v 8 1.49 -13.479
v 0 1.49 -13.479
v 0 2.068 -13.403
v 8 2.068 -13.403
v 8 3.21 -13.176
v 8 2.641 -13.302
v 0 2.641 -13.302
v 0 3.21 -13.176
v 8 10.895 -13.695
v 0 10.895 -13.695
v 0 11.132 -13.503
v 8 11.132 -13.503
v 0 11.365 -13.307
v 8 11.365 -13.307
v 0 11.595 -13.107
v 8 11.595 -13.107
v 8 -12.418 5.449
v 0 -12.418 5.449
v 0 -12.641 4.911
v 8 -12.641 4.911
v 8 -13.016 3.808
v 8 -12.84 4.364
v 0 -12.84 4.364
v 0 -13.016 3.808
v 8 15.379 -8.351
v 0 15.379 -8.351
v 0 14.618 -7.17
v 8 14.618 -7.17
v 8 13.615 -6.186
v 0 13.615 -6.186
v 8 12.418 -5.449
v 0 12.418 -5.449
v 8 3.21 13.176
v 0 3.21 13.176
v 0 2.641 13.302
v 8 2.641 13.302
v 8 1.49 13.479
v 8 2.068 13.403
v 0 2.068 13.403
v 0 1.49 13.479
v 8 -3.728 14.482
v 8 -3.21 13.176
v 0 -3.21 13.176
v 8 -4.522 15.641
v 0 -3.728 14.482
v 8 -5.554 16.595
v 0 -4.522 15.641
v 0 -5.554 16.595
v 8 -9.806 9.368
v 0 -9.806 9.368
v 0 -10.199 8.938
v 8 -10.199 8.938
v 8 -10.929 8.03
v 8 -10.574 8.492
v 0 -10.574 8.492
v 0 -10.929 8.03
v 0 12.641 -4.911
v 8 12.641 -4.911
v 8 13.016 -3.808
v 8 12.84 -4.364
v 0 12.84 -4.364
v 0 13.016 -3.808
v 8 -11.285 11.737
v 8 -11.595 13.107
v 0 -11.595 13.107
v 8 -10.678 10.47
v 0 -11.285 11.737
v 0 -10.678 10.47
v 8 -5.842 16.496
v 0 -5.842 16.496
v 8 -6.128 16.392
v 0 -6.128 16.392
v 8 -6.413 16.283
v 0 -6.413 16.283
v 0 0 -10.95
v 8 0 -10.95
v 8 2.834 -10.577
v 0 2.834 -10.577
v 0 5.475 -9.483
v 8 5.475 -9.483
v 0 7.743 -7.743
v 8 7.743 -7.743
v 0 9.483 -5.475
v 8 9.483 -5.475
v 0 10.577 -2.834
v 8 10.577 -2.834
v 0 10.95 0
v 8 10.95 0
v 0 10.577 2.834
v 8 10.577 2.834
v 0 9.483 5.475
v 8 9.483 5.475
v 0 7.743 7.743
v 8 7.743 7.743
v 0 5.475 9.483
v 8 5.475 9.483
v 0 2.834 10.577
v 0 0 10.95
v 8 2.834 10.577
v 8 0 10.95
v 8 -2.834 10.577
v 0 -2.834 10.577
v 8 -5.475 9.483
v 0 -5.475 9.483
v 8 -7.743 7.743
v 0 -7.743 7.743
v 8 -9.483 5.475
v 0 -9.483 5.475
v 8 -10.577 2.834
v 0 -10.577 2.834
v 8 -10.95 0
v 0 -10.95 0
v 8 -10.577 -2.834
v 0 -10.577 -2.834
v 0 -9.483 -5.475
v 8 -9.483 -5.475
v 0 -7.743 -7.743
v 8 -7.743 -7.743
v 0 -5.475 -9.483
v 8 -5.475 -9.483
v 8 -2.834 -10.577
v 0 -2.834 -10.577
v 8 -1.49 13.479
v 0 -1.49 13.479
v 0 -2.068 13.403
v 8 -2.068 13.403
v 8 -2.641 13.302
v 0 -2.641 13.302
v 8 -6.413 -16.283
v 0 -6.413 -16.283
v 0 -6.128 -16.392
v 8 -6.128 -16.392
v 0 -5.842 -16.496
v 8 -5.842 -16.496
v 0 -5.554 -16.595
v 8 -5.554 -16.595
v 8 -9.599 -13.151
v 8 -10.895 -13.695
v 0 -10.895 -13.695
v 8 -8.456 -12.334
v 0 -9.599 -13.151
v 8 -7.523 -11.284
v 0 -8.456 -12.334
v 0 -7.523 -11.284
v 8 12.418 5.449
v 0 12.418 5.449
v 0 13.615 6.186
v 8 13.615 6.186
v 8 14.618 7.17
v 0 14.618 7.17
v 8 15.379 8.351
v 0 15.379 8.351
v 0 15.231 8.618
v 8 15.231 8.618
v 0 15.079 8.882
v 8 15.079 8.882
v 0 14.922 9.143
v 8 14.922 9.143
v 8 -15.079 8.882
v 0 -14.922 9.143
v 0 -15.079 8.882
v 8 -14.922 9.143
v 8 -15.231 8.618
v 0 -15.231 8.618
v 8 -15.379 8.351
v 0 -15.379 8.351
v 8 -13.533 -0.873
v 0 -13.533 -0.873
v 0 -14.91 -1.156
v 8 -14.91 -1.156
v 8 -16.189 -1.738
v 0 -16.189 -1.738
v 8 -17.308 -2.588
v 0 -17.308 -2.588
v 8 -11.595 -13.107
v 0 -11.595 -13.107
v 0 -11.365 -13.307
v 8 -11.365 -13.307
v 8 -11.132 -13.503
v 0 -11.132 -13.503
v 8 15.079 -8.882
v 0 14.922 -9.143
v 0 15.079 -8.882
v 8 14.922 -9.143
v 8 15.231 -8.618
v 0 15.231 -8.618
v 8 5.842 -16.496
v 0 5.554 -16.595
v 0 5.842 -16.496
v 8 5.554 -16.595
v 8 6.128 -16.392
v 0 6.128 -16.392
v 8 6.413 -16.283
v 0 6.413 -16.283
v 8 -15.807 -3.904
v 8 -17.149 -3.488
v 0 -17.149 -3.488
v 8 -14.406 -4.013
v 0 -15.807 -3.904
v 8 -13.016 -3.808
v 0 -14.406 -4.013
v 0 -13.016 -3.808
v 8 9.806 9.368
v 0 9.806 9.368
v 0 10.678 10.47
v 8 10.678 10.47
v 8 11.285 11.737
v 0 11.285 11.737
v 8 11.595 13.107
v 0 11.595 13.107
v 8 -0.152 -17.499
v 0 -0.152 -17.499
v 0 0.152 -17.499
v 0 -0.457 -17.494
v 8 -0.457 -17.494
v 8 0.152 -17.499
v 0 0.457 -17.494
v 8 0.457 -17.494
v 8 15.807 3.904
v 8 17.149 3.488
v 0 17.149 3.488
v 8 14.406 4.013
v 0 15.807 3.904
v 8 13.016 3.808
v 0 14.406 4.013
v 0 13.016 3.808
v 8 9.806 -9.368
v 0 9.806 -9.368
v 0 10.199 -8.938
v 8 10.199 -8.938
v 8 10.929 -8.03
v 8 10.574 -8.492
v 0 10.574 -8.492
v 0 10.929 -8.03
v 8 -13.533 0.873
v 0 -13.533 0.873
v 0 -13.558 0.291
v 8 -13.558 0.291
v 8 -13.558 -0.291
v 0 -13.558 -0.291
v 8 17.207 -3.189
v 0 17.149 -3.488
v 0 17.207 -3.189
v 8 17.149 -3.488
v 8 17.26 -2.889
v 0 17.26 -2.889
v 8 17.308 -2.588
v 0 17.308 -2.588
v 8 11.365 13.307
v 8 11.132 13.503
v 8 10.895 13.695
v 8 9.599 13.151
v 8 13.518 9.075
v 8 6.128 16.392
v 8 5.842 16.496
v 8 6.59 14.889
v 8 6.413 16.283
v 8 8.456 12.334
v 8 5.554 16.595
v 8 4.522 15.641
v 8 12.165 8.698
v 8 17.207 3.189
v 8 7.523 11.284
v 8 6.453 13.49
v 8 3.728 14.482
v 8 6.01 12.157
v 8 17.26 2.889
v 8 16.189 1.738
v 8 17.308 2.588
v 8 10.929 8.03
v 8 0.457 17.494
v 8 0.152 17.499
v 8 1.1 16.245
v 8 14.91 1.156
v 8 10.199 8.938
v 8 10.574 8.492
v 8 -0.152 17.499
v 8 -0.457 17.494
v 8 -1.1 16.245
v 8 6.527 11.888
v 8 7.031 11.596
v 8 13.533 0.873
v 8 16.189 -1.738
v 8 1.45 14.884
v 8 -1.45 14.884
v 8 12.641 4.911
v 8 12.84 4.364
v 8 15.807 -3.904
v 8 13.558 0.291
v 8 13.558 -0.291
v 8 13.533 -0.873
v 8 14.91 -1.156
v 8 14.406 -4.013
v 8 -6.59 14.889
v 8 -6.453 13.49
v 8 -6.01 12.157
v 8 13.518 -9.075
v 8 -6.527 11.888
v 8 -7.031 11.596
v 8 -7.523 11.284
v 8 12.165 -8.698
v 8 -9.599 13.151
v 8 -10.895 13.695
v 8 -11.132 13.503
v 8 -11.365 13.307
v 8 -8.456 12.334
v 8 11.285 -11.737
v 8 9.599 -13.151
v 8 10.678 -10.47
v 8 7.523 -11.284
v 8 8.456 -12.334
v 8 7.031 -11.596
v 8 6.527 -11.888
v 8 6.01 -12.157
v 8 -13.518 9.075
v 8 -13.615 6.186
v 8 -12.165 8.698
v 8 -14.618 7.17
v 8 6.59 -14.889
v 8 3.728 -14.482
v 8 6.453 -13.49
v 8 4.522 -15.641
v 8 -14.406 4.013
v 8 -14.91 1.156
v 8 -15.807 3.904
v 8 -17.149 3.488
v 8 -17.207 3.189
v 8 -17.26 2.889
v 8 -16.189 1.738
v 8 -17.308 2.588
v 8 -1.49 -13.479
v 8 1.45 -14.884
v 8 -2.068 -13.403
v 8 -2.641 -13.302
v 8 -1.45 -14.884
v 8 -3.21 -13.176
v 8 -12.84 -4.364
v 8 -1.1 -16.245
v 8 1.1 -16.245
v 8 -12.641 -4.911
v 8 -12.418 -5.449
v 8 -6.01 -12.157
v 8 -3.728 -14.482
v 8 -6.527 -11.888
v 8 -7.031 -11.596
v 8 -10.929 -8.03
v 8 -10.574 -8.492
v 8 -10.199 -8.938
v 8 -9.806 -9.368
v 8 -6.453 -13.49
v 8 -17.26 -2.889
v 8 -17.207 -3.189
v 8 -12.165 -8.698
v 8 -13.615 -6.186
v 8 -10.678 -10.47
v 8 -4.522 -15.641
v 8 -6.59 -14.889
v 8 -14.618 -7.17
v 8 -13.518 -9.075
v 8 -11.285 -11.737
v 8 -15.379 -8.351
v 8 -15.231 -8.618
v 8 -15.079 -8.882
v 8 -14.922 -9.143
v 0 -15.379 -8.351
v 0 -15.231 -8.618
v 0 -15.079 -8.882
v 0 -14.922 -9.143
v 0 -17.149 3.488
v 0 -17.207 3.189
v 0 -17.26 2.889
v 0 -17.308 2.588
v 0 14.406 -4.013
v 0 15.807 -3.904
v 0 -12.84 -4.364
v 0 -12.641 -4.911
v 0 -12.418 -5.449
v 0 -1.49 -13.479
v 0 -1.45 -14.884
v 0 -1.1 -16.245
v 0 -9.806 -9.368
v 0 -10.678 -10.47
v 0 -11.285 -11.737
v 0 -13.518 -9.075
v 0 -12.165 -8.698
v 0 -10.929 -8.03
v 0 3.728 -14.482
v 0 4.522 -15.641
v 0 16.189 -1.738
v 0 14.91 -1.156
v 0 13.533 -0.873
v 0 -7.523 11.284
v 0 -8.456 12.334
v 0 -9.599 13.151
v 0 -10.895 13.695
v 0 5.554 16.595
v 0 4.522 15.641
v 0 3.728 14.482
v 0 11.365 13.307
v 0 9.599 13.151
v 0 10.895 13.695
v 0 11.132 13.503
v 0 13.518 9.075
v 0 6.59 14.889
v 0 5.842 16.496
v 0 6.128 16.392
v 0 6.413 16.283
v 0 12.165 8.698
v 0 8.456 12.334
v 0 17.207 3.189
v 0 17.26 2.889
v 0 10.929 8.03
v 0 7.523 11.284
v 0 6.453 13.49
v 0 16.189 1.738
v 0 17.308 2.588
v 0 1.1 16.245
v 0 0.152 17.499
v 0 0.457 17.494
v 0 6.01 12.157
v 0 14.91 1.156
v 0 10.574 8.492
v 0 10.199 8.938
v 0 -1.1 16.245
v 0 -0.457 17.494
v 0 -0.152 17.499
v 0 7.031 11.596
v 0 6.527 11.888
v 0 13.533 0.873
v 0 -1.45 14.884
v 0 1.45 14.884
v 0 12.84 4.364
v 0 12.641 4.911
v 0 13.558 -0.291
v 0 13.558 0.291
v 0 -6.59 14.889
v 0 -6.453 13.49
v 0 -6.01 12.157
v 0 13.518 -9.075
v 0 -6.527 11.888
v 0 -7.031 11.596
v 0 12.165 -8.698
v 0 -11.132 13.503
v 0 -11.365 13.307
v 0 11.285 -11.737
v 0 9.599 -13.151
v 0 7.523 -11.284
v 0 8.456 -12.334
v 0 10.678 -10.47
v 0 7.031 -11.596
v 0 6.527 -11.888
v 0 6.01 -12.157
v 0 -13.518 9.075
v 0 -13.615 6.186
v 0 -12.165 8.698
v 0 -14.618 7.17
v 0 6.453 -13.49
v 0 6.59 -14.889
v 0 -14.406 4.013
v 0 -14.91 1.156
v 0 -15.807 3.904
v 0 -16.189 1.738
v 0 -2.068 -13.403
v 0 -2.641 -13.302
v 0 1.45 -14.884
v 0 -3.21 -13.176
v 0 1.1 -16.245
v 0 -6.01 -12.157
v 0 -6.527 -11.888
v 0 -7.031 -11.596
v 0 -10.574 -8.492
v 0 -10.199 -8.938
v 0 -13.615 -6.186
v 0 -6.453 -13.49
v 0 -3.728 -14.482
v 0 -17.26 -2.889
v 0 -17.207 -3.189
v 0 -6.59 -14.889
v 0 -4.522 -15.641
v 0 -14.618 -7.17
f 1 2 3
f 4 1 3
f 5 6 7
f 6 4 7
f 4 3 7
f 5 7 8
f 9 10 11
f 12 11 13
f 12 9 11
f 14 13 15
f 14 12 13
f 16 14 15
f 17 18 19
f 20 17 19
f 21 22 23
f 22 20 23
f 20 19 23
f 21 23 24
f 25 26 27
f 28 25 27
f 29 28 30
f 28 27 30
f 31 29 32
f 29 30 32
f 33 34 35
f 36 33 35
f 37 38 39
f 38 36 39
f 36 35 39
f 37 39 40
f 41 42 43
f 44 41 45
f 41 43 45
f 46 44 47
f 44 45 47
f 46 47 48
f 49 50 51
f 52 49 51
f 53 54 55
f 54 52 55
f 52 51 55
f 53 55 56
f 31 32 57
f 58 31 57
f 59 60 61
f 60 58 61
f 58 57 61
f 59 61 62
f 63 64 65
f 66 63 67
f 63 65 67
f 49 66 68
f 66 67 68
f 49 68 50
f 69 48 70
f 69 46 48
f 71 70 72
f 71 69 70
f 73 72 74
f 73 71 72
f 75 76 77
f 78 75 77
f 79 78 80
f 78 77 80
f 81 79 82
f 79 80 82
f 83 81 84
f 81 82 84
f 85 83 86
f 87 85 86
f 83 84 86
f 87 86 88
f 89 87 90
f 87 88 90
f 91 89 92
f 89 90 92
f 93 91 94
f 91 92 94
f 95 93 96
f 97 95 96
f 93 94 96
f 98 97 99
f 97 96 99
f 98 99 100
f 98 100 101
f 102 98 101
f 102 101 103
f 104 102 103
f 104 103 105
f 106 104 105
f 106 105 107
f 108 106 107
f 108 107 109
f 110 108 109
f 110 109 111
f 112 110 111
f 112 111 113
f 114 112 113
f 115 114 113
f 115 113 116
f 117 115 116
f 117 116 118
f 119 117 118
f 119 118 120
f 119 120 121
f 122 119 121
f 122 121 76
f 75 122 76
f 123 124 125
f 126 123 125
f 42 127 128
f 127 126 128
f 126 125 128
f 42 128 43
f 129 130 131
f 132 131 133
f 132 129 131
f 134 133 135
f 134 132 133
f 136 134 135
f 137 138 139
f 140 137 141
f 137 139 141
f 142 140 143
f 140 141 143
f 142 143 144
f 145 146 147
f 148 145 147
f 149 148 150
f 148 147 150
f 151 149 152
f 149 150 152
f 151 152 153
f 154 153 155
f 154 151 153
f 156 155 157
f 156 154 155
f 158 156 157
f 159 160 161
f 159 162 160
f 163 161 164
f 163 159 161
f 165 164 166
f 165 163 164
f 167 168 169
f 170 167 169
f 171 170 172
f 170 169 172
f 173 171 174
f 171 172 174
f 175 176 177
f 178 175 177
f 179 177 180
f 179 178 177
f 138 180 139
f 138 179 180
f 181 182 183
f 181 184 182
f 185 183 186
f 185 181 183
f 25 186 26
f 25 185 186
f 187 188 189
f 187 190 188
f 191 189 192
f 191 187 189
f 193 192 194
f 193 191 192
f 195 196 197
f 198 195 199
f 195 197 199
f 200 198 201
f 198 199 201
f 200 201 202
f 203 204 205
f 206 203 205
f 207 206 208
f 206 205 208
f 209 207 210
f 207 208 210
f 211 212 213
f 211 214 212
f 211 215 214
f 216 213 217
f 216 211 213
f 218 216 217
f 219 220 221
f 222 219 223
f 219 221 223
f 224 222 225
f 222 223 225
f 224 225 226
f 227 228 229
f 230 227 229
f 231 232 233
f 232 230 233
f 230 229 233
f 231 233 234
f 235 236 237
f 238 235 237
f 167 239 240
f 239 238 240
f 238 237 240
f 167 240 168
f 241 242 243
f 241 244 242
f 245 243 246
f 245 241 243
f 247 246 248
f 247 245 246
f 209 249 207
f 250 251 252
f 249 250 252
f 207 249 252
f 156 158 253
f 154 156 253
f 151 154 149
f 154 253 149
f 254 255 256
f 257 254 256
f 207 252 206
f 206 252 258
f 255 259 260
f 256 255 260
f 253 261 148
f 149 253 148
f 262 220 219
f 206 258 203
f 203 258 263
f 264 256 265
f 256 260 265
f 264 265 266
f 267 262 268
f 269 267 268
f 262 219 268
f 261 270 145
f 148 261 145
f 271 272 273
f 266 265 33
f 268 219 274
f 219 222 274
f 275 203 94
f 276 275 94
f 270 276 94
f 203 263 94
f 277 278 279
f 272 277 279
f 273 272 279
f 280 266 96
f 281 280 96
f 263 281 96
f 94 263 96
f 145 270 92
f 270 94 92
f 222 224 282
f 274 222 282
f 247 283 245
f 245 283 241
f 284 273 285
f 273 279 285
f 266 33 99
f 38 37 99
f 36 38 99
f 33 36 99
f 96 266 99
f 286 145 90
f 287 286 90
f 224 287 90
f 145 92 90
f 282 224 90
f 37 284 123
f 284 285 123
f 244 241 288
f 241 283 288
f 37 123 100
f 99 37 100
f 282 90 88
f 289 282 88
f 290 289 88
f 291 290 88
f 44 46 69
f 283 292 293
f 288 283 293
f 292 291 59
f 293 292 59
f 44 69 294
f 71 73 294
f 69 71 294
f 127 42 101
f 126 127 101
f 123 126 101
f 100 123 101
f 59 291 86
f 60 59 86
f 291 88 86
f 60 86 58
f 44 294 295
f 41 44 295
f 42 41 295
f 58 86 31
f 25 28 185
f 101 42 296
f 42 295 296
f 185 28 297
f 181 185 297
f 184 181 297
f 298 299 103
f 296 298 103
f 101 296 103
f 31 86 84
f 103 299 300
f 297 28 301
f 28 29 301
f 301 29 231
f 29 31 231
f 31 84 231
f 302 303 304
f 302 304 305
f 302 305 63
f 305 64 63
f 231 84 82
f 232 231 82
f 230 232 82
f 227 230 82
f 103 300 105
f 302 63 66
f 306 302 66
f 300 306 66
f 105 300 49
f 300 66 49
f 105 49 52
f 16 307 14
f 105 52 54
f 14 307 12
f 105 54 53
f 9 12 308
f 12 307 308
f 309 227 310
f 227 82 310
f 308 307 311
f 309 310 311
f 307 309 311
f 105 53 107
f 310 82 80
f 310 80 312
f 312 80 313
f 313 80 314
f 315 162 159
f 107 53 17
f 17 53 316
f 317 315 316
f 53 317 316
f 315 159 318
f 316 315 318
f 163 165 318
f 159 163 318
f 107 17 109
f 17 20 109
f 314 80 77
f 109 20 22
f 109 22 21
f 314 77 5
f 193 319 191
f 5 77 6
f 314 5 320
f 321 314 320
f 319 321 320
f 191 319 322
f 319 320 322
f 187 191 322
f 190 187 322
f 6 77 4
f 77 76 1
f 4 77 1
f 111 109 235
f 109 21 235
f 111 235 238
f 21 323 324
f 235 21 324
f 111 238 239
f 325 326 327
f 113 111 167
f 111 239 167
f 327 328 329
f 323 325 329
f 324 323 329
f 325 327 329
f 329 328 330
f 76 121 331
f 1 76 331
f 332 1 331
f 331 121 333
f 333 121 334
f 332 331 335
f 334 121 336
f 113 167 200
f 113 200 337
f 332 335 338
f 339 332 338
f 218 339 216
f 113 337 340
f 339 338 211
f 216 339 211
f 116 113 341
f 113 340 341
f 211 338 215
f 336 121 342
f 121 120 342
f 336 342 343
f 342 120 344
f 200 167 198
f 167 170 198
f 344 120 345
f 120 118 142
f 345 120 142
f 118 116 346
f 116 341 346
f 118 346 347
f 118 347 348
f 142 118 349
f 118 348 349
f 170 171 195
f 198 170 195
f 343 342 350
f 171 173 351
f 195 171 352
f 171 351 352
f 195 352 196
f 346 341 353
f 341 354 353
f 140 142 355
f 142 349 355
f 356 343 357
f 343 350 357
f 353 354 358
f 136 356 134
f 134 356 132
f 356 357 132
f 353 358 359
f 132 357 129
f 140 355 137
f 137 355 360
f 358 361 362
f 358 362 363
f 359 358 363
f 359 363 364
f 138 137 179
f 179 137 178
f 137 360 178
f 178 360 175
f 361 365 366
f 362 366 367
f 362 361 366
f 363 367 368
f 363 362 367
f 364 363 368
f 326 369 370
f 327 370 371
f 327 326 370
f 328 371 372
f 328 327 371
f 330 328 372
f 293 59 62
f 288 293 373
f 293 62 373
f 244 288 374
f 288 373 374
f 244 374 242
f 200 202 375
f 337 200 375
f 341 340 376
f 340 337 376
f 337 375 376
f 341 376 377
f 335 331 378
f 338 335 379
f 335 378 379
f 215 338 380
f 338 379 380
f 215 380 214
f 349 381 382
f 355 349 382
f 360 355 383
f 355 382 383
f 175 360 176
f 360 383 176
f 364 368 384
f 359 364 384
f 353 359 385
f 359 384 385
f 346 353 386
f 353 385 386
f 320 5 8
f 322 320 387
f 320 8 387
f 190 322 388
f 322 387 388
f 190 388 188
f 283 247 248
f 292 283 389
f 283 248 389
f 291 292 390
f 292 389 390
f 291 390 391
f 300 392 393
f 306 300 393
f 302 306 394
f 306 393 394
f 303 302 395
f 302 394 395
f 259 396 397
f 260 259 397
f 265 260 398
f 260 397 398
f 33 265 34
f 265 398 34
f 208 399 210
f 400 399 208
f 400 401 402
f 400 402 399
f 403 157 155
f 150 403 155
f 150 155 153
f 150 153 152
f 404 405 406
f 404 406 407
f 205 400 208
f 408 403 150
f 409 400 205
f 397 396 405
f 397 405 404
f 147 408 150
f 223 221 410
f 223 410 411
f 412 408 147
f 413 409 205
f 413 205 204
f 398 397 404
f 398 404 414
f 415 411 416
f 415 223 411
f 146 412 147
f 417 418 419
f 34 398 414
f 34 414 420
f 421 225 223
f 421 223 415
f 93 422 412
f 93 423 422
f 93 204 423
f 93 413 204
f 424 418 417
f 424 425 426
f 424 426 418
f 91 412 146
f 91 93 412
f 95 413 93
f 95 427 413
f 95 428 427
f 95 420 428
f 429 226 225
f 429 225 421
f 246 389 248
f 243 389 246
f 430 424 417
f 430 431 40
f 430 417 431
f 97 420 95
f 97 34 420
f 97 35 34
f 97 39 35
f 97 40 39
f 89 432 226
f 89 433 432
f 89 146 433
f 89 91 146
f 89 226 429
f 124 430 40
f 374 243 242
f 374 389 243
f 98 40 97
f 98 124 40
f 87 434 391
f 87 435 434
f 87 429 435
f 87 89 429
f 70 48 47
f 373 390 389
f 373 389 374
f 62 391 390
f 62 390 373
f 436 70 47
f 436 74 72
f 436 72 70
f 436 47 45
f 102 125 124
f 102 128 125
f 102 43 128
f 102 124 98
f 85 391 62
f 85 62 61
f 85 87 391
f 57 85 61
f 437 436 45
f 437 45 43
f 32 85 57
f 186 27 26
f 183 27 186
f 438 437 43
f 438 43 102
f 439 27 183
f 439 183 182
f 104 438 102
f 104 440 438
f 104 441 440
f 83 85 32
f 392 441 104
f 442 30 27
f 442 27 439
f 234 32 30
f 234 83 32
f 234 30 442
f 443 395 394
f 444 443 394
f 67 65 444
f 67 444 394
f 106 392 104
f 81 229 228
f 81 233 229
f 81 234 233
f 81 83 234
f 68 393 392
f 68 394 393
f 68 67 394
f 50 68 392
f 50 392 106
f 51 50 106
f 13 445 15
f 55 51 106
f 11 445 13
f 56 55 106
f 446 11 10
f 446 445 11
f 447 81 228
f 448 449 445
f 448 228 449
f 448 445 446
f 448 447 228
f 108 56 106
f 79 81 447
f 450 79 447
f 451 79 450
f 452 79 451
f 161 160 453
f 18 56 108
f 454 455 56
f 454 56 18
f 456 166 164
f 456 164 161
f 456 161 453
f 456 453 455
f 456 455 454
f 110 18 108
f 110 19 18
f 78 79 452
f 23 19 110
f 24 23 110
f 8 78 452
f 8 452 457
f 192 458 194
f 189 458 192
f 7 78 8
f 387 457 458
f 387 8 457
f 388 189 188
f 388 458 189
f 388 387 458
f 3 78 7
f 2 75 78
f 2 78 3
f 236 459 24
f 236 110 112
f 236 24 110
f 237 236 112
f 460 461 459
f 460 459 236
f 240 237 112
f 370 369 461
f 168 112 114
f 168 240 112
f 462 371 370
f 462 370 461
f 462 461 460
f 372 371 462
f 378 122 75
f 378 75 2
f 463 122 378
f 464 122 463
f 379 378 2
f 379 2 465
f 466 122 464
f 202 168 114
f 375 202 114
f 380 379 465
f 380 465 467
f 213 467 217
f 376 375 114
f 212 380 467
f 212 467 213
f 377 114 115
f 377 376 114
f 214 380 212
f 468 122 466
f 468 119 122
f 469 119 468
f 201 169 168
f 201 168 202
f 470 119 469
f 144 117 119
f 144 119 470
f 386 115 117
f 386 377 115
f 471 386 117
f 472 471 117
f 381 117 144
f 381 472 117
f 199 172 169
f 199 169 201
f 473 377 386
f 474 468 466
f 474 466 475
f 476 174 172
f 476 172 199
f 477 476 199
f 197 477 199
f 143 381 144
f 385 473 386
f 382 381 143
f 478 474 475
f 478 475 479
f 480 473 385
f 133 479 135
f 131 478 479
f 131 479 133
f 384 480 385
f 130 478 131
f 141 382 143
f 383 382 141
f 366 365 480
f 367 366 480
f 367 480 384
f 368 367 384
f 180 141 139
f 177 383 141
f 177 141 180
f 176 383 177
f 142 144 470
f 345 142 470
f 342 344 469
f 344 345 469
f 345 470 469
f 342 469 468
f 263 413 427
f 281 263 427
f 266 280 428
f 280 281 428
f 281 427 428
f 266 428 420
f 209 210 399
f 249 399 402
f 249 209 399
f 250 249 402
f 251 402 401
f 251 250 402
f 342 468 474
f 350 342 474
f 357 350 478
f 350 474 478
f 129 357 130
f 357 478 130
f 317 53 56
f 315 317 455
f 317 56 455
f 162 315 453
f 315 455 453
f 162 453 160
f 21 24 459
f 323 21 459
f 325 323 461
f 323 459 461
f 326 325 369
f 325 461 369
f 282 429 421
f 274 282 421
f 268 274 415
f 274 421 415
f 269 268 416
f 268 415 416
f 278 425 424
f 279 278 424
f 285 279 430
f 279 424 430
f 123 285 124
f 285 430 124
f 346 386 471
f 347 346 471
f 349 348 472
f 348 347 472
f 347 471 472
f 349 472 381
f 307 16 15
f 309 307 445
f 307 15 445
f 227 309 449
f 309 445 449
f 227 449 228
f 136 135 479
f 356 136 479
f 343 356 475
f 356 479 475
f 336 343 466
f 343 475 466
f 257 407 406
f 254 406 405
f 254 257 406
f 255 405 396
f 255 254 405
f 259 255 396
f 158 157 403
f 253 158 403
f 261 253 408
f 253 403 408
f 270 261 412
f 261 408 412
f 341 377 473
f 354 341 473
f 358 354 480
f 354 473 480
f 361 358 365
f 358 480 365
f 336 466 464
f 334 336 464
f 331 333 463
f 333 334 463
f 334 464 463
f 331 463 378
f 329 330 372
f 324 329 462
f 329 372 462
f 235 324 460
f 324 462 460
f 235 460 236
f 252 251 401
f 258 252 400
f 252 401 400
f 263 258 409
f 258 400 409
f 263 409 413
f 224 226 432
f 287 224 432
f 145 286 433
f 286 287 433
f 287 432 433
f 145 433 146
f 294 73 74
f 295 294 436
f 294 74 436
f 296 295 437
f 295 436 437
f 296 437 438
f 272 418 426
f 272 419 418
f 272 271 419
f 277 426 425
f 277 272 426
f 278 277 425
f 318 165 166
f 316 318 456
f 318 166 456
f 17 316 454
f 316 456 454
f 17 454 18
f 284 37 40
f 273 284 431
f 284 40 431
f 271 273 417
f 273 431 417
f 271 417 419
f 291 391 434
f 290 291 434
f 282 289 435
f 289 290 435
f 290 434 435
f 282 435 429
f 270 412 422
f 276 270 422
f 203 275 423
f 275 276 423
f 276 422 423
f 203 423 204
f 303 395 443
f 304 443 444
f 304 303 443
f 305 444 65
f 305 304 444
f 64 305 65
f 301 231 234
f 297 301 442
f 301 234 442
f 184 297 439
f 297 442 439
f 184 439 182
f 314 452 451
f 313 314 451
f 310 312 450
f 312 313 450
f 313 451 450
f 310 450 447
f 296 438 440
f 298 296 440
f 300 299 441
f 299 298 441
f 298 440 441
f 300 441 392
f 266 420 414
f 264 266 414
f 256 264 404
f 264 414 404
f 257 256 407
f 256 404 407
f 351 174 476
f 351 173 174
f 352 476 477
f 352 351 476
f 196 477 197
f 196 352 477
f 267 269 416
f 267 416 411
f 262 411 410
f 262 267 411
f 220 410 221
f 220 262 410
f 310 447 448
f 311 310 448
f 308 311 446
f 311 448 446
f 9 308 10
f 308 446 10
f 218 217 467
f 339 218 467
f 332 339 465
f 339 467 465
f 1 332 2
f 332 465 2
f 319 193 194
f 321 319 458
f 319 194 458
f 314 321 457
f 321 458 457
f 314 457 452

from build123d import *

# Parameters (mm, degrees)
BASPROSKE_W             = 8
BASPROSKE_H             = 17.5
TOOTHCUT_DEPTH          = 27.009613607
TEETHCUTS_COUNT         = 18
TEETHCUTS_ANGLE         = 340
BORSKE_R                = 4
BORE_DEPTH              = 50.0000508
ESQUISSE1_R             = 10.95
ENL_V_MAT_EXTRU_1_DEPTH = 10


with BuildPart() as part:
    # BasProSke → Base-Revolve (revolve)
    with BuildSketch(Plane(origin=(0, 0, 0), x_dir=(1, 0, 0), z_dir=(0, 1, 0)), mode=Mode.PRIVATE) as base_revolve_sk:
        with Locations((4, 8.75)):
            Rectangle(BASPROSKE_W, BASPROSKE_H)
    revolve(base_revolve_sk.sketch.rotate(Axis((-10, 0, 0), (1, 0, 0)), 180), axis=Axis((-10, 0, 0), (1, 0, 0)))

    # TooCutSke → ToothCut (cut, through all)
    with BuildSketch(Plane(origin=(0, 0, 0), x_dir=(0, 0, -1), z_dir=(1, 0, 0))):
        with BuildLine():
            ThreePointArc((0.873326889, 13.533350745), (0, 13.5615), (-0.873326889, 13.533350745))
            ThreePointArc((-0.873326889, 13.533350745), (-1.417662776, 15.579682129), (-2.609262071, 17.330072031))
            ThreePointArc((-2.609262071, 17.330072031), (0, 17.5254), (2.609262071, 17.330072031))
            ThreePointArc((2.609262071, 17.330072031), (1.417662776, 15.579682129), (0.873326889, 13.533350745))
        make_face()
    toothcut = extrude(amount=TOOTHCUT_DEPTH, mode=Mode.SUBTRACT)

    # TeethCuts: ToothCut ×18 about axis
    teethcuts_axis = Axis((-10, 0, 0), (1, 0, 0))
    for i in range(1, TEETHCUTS_COUNT):
        add(toothcut.rotate(teethcuts_axis, i * TEETHCUTS_ANGLE / (TEETHCUTS_COUNT - 1)), mode=Mode.SUBTRACT)

    # BorSke → Bore (cut, symmetric)
    with BuildSketch(Plane(origin=(0, 0, 0), x_dir=(0, 0, -1), z_dir=(1, 0, 0))):
        with Locations(Location((0, 0, 0), (0, 0, 180))):
            Circle(BORSKE_R)
    extrude(amount=BORE_DEPTH, both=True, mode=Mode.SUBTRACT)

    # Esquisse1 → Enlèv. mat.-Extru.1 (cut)
    with BuildSketch(Plane(origin=(8, 0, 0), x_dir=(0, 0, -1), z_dir=(1, 0, 0))):
        Circle(ESQUISSE1_R)
    extrude(amount=-ENL_V_MAT_EXTRU_1_DEPTH, mode=Mode.SUBTRACT)


solid = part.part
